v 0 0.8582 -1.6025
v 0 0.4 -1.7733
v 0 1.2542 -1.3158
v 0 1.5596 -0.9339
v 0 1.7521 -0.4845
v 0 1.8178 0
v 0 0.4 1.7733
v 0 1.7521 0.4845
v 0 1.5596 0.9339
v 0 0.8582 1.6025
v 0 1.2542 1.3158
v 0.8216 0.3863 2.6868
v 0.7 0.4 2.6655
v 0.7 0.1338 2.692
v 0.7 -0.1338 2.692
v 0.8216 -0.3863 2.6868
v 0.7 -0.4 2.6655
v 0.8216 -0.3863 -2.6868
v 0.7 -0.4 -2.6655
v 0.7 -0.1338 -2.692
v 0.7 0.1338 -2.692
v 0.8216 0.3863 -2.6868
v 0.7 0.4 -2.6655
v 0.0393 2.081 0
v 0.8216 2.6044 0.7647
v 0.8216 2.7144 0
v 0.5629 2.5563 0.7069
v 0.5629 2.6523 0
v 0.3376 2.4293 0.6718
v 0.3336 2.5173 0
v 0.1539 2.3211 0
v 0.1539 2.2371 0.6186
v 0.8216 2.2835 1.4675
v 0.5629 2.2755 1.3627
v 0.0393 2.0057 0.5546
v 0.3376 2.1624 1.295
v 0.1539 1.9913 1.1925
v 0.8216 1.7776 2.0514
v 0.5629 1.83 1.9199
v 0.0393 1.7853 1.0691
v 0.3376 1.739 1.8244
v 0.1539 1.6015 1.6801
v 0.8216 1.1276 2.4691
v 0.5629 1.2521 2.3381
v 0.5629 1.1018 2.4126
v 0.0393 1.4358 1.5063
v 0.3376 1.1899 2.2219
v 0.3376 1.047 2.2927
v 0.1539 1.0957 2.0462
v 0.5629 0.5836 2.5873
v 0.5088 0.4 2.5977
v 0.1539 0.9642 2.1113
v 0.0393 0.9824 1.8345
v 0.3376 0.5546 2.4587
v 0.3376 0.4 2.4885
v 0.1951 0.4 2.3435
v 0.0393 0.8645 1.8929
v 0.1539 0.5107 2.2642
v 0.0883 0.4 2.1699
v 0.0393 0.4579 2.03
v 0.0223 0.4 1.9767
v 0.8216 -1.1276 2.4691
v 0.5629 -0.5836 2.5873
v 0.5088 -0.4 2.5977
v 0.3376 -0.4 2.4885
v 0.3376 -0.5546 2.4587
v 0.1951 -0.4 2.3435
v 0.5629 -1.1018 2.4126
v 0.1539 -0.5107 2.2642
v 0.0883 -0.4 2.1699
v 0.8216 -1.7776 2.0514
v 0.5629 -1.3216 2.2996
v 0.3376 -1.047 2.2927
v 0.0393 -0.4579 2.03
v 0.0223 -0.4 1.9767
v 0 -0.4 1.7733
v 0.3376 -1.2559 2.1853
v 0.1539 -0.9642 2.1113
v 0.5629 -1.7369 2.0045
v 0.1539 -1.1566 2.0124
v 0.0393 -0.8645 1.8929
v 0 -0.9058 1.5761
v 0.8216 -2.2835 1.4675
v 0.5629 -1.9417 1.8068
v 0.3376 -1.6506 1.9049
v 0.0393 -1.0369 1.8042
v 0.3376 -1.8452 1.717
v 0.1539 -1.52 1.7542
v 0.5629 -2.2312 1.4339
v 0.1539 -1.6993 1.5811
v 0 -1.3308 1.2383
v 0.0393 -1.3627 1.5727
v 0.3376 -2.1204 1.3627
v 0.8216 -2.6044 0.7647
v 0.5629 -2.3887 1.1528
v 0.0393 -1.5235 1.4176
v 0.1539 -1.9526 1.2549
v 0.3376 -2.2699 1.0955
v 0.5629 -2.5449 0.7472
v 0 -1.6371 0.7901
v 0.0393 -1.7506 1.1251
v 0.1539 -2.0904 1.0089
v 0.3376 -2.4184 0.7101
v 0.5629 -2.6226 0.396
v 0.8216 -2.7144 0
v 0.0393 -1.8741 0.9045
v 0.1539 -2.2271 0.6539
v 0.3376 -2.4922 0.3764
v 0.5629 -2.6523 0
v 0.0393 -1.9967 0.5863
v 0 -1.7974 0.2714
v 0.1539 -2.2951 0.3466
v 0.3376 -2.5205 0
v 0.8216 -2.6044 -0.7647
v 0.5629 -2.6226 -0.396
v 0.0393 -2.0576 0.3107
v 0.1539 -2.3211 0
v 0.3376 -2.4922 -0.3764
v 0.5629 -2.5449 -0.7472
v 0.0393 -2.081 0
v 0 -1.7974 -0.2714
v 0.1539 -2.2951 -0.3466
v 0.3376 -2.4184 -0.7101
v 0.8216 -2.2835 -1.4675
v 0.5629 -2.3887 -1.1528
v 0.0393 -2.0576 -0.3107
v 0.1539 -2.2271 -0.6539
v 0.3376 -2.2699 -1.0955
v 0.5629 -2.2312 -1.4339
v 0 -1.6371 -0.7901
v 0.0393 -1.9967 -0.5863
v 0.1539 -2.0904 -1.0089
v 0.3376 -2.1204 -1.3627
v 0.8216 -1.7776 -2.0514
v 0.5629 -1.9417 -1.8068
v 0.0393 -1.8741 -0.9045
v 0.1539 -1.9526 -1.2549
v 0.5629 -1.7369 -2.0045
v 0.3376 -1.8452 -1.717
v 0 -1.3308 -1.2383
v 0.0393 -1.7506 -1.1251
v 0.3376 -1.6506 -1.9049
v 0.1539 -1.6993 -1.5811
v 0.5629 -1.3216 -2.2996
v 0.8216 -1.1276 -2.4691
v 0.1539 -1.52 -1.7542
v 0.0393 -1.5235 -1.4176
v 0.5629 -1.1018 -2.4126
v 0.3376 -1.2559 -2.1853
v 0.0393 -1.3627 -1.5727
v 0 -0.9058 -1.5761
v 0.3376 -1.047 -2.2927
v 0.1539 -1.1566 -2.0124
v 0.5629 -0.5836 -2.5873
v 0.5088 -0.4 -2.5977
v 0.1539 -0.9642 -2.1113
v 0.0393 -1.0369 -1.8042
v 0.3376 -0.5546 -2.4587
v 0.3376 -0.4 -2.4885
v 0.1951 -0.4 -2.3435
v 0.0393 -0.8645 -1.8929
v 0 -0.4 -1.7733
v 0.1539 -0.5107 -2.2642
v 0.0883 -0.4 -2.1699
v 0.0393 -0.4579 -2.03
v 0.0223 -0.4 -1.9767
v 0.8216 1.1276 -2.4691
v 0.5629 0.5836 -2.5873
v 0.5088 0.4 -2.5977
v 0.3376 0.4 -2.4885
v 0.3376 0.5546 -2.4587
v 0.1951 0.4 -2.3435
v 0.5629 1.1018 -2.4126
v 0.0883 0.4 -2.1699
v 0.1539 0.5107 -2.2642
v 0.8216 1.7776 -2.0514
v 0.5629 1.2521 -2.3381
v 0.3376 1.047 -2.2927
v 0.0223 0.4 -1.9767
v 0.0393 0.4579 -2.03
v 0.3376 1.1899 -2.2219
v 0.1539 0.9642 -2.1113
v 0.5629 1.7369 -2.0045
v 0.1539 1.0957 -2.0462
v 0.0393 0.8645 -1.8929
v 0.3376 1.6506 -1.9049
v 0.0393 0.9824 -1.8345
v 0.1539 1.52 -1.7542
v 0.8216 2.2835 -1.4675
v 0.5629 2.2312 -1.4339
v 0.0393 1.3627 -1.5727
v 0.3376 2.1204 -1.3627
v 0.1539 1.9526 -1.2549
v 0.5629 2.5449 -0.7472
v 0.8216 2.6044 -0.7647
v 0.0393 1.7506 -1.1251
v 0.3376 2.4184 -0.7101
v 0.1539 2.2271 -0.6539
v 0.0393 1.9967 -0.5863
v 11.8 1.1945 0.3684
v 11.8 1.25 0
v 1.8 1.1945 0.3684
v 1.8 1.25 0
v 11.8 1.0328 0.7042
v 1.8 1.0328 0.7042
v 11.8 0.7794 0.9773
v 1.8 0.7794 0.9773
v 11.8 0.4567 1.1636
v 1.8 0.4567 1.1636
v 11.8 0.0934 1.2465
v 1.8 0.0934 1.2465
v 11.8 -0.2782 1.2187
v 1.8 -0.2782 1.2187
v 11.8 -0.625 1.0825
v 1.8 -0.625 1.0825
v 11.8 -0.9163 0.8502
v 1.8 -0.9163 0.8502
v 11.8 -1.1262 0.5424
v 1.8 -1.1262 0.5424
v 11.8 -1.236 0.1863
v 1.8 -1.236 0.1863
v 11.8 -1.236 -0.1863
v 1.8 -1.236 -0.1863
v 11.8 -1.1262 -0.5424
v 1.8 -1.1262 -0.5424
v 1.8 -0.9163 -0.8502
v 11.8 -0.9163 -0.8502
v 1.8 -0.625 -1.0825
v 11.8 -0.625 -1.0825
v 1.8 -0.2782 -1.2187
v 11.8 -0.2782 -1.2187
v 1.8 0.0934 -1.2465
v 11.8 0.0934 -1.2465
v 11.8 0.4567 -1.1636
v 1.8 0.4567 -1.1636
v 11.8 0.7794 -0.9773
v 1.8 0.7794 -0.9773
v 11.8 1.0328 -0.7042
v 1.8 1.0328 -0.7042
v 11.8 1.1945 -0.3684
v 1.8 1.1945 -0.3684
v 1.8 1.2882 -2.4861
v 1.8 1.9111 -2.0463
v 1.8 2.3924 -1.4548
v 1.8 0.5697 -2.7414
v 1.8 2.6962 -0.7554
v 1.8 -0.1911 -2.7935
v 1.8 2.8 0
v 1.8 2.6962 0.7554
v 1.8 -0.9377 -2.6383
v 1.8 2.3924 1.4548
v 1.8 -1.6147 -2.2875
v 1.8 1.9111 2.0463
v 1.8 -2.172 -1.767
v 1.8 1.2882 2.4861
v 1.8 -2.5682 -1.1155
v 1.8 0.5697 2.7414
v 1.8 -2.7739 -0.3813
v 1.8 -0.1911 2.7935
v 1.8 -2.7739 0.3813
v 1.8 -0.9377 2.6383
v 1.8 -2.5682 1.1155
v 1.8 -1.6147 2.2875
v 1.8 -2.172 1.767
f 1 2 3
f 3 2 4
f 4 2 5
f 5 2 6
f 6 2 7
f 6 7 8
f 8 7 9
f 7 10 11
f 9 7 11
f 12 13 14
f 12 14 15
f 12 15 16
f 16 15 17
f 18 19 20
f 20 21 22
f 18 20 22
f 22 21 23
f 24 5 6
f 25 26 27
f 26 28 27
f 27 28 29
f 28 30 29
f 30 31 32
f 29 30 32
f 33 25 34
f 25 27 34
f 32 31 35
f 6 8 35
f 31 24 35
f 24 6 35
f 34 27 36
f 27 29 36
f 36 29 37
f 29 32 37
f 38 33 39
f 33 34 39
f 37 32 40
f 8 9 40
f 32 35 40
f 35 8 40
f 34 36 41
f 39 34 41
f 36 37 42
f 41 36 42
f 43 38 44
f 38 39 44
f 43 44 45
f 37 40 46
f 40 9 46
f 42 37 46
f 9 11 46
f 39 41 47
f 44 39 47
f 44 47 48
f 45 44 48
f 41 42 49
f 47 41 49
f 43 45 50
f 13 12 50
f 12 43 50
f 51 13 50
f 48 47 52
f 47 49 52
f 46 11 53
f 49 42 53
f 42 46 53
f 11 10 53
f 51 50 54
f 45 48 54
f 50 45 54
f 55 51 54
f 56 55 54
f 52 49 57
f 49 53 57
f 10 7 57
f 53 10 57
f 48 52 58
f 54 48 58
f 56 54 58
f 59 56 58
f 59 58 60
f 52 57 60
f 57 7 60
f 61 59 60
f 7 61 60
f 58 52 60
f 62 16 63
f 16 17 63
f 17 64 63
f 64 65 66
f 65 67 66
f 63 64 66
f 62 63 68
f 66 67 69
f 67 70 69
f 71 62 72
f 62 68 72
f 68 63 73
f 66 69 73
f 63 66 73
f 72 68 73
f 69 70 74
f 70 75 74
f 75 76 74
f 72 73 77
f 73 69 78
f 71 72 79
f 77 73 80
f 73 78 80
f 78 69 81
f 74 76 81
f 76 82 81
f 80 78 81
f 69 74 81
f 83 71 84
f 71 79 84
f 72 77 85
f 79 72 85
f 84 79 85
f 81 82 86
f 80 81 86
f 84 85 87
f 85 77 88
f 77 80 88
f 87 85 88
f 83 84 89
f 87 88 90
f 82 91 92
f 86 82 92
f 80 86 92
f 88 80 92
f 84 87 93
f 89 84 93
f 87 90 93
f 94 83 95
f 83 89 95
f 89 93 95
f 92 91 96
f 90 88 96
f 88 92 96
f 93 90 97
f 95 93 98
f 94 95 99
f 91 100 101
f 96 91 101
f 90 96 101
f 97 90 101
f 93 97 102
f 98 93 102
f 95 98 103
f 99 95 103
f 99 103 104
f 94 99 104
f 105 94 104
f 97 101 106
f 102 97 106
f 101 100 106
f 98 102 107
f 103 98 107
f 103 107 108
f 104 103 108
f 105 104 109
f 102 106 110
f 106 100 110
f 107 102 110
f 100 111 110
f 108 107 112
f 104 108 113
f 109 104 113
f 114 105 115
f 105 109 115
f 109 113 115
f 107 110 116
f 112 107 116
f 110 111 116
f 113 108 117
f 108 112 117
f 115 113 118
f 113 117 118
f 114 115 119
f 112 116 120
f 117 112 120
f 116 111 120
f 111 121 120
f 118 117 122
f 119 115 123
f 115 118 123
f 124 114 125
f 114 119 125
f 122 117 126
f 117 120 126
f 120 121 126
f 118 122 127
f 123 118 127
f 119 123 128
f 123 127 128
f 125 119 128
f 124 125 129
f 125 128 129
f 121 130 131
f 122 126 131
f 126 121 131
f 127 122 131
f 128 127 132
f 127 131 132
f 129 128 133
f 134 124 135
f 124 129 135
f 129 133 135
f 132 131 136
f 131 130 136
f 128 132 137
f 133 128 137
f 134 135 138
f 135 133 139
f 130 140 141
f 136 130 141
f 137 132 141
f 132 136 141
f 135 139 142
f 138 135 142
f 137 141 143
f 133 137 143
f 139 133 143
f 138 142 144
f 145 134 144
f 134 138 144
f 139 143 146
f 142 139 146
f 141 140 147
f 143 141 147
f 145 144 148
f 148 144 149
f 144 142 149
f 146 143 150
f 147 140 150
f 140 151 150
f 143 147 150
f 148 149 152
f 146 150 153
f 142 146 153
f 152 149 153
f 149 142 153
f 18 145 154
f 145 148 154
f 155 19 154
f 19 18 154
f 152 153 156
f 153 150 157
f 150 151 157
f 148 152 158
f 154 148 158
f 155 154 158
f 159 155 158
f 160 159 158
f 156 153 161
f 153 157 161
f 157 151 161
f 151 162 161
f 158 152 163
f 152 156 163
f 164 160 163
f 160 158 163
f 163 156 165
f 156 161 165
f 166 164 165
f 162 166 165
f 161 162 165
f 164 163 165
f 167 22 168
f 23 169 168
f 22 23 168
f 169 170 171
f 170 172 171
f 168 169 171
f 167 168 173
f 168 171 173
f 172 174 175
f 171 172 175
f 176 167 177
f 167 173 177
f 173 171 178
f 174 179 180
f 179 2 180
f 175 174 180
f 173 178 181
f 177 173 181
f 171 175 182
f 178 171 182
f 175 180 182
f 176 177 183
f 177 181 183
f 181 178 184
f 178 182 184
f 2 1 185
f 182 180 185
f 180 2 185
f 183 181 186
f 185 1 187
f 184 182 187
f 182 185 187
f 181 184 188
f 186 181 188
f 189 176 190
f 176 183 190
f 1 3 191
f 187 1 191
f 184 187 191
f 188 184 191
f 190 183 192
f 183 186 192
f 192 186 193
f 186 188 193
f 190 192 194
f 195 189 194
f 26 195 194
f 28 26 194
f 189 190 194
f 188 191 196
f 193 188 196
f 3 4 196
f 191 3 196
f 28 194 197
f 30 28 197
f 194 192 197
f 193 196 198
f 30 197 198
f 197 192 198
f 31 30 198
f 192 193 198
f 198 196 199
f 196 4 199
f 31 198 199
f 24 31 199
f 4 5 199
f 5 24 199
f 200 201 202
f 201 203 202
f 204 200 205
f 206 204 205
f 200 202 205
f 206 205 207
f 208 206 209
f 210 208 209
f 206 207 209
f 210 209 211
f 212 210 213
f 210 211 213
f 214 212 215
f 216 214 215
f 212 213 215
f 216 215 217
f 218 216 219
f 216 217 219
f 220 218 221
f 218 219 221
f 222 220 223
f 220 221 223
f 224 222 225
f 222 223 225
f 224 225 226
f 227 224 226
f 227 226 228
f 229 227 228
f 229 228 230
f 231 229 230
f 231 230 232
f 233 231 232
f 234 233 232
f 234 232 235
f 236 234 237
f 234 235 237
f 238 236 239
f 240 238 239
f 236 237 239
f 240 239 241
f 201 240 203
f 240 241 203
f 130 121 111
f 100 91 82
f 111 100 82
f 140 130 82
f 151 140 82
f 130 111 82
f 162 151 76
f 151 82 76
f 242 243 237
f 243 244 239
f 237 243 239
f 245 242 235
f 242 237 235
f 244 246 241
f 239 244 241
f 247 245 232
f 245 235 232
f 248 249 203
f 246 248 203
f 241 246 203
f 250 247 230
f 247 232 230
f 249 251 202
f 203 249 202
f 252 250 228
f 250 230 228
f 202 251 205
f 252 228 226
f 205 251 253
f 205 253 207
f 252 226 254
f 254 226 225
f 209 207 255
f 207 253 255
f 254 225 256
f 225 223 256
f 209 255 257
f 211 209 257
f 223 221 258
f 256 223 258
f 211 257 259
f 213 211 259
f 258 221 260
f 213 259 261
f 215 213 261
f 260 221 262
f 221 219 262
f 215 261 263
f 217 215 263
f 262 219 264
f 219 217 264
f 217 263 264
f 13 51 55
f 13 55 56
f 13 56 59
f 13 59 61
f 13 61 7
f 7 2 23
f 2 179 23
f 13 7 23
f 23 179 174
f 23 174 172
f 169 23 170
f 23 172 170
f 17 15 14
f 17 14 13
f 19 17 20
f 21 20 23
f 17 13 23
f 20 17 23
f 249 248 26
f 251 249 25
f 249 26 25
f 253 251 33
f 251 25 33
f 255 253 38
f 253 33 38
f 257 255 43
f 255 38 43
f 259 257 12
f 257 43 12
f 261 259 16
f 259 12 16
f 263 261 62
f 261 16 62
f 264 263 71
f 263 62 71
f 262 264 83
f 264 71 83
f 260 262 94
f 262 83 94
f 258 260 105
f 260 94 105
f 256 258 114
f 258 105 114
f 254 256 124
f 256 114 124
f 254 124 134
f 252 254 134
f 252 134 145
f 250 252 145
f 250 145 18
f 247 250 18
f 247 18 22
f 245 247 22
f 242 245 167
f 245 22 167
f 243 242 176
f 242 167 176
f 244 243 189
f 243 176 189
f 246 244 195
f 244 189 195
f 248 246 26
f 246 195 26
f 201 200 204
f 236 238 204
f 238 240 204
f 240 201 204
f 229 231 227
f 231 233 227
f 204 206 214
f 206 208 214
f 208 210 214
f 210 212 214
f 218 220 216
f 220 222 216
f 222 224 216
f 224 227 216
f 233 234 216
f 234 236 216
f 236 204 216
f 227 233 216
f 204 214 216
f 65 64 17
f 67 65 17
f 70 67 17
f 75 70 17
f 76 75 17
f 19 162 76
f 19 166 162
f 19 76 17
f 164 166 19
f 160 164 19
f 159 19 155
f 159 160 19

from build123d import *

# Parameters (mm, degrees)
FILLET2_R  = 0.9
SKETCH2_W  = 5.6
SKETCH2_H  = 0.8
SLOT_DEPTH = 0.7


with BuildPart() as part:
    # BodySke → Base-Revolve (revolve)
    with BuildSketch(Plane.XY):
        Polygon((1.8, 1.25), (1.8, 2.8), (0, 2.642520406), (0, 0), (11.8, 0), (11.8, 1.25), align=None)
    revolve(axis=Axis((-25.4, 0, 0), (1, 0, 0)))

    # Fillet2
    fillet2_edges = [part.edges().sort_by_distance(p)[0] for p in [
        (0, -2.642520406, 0),
    ]]
    fillet(fillet2_edges, radius=FILLET2_R)

    # Sketch2 → Slot (cut)
    with BuildSketch(Plane(origin=(0, 0, 0), x_dir=(0, 0, -1), z_dir=(1, 0, 0))):
        Rectangle(SKETCH2_W, SKETCH2_H)
    extrude(amount=SLOT_DEPTH, mode=Mode.SUBTRACT)


solid = part.part
